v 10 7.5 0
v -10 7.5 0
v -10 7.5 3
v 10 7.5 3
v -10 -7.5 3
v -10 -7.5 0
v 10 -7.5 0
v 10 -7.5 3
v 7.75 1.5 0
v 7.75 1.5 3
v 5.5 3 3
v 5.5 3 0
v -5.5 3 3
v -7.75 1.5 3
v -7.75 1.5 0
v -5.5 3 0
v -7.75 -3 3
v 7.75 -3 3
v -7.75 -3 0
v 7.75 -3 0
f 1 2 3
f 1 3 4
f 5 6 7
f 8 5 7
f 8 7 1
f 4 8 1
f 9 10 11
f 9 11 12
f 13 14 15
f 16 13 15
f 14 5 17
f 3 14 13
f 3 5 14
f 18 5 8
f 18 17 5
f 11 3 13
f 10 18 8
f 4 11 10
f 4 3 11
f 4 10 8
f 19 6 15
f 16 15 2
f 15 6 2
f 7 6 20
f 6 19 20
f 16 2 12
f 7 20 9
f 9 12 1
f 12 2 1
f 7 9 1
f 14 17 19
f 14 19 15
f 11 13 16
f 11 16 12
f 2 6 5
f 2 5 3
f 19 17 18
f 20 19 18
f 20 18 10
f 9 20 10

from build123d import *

# Parameters (mm, degrees)
F0_W     = 20
F0_H     = 15
F1_DEPTH = 3
F2_W     = 15.5
F2_H     = 6
F3_DEPTH = 25
F4_SIZE2 = 1.5
F4_SIZE  = 2.25


with BuildPart() as f1:
    # F0 (on Top) → F1 (new body)
    with BuildSketch(Plane.XY):
        Rectangle(F0_W, F0_H)
    extrude(amount=F1_DEPTH)

    # F2 (on face) → F3 (cut)
    with BuildSketch(Plane.XY.offset(3)):
        Rectangle(F2_W, F2_H)
    extrude(amount=-F3_DEPTH, mode=Mode.SUBTRACT)

    # F4
    f4_edges = [f1.edges().sort_by_distance(p)[0] for p in [
        (-7.75, 3, 1.5),
        (7.75, 3, 1.5),
    ]]
    f4_side = f1.faces().sort_by_distance((0, 3, 1.5))[0]
    chamfer(f4_edges, length=F4_SIZE, length2=F4_SIZE2, reference=f4_side)


solid = f1.part
